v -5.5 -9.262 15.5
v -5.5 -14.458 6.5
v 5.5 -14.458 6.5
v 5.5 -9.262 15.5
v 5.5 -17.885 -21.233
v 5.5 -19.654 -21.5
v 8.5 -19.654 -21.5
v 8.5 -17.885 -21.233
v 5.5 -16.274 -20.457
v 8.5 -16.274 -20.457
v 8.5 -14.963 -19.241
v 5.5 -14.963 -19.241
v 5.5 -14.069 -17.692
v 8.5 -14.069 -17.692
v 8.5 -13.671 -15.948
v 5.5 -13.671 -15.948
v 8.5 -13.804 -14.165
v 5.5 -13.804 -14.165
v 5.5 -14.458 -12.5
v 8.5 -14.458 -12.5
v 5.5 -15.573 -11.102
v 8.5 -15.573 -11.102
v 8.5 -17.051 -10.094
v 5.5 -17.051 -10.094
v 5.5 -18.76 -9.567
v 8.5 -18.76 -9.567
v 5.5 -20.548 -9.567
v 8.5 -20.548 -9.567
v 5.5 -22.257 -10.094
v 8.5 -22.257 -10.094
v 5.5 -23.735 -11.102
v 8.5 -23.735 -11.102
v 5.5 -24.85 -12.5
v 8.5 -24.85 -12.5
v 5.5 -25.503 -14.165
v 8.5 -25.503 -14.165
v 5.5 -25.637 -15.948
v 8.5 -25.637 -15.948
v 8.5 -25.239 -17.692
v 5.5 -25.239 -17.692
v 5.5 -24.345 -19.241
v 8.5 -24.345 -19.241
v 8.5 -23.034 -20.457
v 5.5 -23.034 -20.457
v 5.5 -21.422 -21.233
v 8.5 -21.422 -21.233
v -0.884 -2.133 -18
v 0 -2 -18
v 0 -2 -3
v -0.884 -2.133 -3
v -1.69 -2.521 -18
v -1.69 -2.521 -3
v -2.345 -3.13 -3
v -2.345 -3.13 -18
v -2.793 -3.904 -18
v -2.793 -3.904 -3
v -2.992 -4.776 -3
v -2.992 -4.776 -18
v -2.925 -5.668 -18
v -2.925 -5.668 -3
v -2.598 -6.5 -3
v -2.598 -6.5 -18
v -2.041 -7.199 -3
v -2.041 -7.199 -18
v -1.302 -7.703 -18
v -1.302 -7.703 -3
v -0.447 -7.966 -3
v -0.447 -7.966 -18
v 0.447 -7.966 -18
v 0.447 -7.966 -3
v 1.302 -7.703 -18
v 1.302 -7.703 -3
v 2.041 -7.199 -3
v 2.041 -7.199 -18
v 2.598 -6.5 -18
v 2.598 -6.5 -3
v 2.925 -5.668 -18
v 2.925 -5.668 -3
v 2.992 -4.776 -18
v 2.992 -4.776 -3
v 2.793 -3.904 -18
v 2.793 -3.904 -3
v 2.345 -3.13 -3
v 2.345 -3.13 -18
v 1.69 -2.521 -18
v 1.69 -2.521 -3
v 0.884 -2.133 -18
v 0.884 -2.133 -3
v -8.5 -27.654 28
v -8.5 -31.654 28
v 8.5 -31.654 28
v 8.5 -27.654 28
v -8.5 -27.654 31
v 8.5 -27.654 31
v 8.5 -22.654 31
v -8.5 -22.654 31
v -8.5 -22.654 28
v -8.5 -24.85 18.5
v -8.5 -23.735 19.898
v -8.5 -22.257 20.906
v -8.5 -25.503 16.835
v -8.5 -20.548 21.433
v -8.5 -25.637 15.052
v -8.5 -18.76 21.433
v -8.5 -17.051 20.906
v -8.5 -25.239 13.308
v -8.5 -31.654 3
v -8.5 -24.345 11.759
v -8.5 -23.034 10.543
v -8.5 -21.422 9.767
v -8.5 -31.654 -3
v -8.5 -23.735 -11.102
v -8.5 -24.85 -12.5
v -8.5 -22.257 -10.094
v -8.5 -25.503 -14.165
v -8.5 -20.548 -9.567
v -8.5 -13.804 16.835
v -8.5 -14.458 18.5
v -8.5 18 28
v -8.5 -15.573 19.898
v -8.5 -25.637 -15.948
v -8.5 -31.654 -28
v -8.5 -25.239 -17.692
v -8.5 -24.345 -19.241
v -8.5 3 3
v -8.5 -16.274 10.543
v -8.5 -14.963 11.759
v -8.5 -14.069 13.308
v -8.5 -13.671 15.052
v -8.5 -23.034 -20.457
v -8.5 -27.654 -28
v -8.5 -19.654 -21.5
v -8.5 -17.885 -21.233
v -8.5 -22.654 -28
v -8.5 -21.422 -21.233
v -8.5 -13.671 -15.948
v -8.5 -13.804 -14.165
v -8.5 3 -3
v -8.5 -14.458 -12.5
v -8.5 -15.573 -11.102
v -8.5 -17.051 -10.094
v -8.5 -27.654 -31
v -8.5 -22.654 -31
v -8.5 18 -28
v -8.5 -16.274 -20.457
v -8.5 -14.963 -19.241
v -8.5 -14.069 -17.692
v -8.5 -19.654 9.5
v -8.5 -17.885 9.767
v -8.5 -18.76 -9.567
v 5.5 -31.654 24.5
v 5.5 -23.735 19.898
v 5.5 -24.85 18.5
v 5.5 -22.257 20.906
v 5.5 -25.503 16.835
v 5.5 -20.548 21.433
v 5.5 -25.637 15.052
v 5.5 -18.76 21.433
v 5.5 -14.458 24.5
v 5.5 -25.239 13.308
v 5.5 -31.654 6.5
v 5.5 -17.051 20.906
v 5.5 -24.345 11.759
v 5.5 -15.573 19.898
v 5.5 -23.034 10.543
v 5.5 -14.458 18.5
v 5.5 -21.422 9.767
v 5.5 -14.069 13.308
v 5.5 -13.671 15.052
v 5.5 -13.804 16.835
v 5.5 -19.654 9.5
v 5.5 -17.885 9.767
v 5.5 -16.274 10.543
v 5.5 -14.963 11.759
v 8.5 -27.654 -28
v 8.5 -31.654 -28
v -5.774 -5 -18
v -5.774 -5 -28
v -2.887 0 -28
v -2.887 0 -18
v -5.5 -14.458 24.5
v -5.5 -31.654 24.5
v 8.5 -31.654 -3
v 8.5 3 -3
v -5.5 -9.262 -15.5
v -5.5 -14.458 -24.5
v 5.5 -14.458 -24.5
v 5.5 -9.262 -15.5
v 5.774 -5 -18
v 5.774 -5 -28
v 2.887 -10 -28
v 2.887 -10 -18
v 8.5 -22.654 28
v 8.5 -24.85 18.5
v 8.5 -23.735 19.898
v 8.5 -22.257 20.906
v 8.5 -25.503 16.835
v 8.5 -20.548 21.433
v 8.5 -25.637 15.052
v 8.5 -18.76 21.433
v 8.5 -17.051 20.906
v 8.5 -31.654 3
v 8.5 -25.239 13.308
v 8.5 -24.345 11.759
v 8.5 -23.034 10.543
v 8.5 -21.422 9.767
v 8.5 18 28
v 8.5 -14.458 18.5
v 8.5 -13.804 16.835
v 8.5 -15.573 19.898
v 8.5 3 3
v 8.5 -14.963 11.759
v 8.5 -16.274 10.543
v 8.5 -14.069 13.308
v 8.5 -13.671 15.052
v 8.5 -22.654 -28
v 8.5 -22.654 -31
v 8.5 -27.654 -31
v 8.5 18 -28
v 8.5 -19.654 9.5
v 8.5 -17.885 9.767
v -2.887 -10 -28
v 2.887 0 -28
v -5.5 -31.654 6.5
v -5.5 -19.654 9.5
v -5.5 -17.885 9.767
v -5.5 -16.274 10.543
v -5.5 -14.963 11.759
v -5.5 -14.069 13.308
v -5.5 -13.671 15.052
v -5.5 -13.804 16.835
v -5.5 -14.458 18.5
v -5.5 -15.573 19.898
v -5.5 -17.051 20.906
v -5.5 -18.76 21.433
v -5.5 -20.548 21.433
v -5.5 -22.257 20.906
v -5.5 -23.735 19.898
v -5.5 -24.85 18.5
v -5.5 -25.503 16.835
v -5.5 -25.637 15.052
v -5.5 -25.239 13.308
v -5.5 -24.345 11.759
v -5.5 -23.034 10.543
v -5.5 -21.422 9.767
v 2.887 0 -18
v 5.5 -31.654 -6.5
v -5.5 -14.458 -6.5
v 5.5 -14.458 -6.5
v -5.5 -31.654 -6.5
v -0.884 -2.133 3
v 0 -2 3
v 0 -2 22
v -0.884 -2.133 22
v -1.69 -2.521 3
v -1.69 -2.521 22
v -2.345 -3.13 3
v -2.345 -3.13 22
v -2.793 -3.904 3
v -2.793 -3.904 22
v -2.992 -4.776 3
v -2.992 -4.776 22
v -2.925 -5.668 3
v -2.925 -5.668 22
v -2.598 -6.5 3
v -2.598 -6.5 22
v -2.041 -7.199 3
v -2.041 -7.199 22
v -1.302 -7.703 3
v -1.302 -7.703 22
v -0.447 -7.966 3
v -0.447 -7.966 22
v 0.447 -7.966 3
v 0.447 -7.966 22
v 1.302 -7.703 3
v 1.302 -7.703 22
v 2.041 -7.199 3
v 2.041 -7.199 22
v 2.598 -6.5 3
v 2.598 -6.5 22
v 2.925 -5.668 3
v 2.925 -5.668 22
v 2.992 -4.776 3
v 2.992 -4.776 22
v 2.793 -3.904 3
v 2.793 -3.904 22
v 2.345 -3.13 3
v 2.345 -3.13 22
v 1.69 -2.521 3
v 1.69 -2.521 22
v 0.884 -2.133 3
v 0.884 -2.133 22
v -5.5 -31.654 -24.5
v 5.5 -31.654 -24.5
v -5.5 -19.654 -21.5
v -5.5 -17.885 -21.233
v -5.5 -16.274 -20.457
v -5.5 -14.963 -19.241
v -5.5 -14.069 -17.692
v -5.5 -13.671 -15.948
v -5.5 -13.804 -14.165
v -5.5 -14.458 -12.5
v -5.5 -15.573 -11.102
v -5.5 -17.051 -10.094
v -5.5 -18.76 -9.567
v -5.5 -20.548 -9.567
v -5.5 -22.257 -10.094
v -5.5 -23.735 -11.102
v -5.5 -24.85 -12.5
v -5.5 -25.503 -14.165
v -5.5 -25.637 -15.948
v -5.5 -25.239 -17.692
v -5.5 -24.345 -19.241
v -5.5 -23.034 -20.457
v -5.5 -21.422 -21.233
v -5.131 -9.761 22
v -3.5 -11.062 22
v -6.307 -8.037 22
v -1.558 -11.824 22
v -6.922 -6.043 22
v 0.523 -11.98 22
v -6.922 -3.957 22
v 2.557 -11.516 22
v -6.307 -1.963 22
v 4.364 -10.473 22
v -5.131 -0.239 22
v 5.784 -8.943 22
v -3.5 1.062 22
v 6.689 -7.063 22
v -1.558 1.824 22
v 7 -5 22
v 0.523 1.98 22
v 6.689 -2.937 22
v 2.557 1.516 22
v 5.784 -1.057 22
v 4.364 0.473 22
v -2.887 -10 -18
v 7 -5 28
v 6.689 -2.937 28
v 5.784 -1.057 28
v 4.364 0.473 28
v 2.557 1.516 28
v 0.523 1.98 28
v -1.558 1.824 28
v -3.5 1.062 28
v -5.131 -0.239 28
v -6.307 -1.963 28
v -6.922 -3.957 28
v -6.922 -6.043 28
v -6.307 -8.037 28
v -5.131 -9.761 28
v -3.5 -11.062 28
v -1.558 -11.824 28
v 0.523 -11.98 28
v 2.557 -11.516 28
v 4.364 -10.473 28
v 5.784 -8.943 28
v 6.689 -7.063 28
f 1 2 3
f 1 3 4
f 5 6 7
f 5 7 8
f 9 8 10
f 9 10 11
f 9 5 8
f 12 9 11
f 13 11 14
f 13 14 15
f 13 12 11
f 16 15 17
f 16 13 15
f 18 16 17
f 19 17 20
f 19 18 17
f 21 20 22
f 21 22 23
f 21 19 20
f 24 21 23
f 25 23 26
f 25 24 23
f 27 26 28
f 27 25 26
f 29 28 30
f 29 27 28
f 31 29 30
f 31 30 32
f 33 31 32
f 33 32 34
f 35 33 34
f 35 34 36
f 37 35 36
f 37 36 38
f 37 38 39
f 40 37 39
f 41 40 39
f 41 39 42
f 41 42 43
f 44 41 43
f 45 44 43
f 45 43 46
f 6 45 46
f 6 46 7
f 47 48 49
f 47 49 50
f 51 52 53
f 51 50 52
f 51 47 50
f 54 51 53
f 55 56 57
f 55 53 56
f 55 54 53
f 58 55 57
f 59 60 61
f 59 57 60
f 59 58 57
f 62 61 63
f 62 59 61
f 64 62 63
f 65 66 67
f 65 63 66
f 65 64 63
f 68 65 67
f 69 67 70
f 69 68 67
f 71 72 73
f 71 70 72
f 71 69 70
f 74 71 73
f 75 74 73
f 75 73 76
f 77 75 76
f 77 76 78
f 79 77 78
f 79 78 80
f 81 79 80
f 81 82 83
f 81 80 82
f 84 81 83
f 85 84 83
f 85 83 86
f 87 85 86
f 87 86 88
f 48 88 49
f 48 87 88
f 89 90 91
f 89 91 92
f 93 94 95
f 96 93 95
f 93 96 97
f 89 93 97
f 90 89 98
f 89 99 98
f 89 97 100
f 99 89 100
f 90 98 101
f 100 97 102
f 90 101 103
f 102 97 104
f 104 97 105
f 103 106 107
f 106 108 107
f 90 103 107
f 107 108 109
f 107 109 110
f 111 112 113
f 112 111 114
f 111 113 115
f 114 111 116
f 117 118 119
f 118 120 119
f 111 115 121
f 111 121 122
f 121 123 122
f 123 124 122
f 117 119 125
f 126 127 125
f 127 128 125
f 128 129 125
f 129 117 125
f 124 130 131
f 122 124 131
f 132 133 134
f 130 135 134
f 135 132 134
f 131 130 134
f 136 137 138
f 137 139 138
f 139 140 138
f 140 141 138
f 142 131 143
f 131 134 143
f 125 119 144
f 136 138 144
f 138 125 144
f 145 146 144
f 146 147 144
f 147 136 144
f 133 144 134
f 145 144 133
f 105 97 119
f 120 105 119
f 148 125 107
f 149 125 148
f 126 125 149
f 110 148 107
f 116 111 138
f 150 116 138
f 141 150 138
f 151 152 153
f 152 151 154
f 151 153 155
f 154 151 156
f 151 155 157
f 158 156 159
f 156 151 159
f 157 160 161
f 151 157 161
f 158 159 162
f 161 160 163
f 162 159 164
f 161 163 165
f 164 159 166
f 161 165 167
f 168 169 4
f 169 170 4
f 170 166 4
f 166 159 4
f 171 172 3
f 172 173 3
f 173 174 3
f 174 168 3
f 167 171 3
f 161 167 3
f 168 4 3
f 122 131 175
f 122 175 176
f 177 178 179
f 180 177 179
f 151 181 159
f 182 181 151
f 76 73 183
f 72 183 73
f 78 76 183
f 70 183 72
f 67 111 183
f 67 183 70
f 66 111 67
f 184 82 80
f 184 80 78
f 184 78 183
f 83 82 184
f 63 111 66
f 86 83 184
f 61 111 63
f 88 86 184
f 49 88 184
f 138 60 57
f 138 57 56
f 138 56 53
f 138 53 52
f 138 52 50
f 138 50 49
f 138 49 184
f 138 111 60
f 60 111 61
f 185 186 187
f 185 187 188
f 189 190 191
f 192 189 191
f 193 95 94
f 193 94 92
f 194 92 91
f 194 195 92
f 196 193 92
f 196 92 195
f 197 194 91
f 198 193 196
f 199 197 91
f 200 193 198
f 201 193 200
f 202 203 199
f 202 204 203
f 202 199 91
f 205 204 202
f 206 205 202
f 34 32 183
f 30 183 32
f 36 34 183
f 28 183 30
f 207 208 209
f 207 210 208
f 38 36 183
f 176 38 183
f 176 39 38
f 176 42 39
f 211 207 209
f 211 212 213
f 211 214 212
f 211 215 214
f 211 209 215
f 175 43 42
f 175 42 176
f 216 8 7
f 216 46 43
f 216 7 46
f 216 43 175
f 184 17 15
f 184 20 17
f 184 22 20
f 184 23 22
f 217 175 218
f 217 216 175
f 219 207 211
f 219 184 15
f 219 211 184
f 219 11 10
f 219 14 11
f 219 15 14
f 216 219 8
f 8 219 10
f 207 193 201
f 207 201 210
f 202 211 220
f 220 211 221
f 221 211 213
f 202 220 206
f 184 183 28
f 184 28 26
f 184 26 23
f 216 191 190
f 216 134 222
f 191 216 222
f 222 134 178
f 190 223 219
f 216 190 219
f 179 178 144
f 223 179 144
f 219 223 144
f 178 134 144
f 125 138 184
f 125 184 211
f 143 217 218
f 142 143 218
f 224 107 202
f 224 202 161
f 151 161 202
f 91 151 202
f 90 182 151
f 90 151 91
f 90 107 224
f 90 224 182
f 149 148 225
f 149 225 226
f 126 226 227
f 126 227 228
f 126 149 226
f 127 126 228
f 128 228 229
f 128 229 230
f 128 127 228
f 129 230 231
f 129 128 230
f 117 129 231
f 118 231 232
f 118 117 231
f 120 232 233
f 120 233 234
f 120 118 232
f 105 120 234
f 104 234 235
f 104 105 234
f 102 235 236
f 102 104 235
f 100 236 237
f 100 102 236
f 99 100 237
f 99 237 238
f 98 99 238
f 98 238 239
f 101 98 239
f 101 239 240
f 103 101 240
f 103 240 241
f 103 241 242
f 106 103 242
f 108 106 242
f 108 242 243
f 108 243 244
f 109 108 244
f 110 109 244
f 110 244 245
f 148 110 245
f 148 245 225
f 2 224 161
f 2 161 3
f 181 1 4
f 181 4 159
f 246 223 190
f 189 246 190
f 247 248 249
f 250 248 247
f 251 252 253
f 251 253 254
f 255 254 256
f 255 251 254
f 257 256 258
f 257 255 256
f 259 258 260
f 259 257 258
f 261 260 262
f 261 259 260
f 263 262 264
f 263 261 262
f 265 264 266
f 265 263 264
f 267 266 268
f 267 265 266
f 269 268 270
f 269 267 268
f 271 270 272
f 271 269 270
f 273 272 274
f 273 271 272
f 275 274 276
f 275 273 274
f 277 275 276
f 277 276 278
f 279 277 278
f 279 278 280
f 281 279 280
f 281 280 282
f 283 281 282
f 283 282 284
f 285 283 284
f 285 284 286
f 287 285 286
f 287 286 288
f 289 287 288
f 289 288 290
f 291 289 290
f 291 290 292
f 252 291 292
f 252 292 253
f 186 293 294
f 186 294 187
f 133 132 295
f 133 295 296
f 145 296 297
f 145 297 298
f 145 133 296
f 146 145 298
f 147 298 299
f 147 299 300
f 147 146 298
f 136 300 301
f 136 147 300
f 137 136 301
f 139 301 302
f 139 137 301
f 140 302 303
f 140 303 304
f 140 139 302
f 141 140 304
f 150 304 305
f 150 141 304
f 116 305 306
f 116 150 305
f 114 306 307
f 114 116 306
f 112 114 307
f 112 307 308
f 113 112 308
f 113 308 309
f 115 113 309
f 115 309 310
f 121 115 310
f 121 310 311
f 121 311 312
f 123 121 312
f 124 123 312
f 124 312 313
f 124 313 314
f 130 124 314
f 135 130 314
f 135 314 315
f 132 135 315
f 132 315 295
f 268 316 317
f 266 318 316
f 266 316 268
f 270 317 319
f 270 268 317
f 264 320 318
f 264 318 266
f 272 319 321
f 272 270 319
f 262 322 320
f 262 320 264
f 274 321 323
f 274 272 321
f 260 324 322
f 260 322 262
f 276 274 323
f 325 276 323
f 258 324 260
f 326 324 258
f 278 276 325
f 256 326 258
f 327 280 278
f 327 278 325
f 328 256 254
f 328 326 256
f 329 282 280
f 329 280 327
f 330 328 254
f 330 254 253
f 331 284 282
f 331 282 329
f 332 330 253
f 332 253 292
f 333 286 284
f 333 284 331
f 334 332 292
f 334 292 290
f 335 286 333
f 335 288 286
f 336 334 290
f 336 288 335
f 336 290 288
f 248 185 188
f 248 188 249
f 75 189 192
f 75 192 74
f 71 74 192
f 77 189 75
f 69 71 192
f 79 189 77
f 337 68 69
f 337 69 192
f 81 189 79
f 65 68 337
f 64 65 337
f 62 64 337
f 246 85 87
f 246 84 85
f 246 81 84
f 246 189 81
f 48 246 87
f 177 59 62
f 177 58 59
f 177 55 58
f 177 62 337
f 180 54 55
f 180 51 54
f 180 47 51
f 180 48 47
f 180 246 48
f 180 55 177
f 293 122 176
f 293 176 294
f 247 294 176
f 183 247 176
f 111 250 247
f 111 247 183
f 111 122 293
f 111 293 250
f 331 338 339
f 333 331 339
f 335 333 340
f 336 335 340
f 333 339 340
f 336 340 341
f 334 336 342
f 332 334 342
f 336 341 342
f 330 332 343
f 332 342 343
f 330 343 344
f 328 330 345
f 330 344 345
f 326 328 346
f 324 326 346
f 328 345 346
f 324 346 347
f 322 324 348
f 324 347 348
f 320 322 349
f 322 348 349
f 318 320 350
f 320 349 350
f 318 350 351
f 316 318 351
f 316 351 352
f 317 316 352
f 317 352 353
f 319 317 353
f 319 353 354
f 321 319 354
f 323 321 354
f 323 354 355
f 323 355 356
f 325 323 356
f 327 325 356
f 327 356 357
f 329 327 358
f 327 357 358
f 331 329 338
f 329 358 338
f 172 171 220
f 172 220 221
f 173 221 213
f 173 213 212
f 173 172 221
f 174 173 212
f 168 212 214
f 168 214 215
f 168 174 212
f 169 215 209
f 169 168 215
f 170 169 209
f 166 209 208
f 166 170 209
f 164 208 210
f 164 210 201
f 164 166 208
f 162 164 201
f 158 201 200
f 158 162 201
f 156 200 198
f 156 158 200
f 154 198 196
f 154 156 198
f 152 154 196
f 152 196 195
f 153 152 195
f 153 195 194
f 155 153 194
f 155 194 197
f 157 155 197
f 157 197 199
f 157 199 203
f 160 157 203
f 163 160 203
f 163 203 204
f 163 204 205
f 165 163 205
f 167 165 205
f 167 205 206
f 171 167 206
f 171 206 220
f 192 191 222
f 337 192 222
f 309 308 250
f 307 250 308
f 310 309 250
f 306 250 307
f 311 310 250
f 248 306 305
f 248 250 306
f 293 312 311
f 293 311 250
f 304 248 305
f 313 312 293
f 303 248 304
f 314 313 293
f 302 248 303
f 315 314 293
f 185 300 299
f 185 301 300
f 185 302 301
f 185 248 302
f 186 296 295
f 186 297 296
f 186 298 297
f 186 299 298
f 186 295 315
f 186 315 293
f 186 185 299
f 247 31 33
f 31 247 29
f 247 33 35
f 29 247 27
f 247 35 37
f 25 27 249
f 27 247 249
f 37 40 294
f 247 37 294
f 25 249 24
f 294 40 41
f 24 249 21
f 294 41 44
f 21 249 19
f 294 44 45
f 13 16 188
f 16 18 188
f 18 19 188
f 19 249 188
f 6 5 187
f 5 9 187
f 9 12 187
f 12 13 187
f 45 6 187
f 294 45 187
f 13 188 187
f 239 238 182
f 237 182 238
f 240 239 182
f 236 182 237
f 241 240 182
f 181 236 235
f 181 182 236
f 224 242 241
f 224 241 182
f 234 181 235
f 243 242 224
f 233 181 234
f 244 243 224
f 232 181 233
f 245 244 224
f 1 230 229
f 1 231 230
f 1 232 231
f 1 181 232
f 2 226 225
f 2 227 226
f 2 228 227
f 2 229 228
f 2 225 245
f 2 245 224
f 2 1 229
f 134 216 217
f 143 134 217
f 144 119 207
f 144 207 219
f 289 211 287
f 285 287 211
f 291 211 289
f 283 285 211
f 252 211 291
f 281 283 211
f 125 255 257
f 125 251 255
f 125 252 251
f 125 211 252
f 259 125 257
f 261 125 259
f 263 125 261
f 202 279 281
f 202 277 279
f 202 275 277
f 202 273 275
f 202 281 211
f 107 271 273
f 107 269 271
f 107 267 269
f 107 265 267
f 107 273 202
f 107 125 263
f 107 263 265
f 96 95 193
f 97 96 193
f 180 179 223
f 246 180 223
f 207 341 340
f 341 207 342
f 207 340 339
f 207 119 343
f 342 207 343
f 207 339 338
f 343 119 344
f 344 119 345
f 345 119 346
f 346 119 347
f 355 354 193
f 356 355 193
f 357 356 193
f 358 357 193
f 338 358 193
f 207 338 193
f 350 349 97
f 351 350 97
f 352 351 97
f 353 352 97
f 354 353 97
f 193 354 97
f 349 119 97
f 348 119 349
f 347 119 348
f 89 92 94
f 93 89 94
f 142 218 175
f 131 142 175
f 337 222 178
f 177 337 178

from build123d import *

# Parameters (mm, degrees)
BOSS_EXTRUDE2_DEPTH      = 8.5
BOSS_EXTRUDE2_DEPTH_BACK = 8.5
SKETCH1_R                = 6
CUT_EXTRUDE1_DEPTH       = 5.5
CUT_EXTRUDE1_DEPTH_BACK  = 5.5
SKETCH1_4_R              = 6
CUT_EXTRUDE2_DEPTH       = 68.492341935
CUT_EXTRUDE2_DEPTH_BACK  = 68.492341935
SKETCH3_R                = 3
SKETCH3_3_R              = 7
SKETCH3_3_R_2            = 3
CUT_EXTRUDE3_DEPTH       = 6
CUT_EXTRUDE4_DEPTH       = 10


with BuildPart() as part:
    # Sketch1 → Boss-Extrude2 (new, two sides: drawn at the far end of the back side and taken through both)
    with BuildSketch(Plane(origin=(0, 0, 0), x_dir=(0, 0, -1), z_dir=(1, 0, 0)).offset(-BOSS_EXTRUDE2_DEPTH_BACK)):
        Polygon((-28, -22.65385), (-31, -22.65385), (-31, -27.65385), (-28, -27.65385), (-28, -31.65385), (-3, -31.65385), (-3, 3), (3, 3), (3, -31.65385), (28, -31.65385), (28, -27.65385), (31, -27.65385), (31, -22.65385), (28, -22.65385), (28, 18), (-28, 18), align=None)
        with Locations((15.5, -19.65385)):
            Circle(SKETCH1_R, mode=Mode.SUBTRACT)
        with Locations((-15.5, -19.65385)):
            Circle(SKETCH1_R, mode=Mode.SUBTRACT)
    extrude(amount=BOSS_EXTRUDE2_DEPTH + BOSS_EXTRUDE2_DEPTH_BACK)

    # Sketch1<4> → Cut-Extrude1 (cut, two sides: drawn at the far end of the back side and taken through both)
    # profile 1 of 2: a face of its own
    with BuildSketch(Plane(origin=(0, 0, 0), x_dir=(0, 0, -1), z_dir=(1, 0, 0)).offset(-CUT_EXTRUDE1_DEPTH_BACK)):
        Polygon((-24.5, -14.457697577), (-24.5, -31.65385), (-6.5, -31.65385), (-6.5, -14.457697577), (-15.5, -9.261545155), align=None)
        with Locations((-15.5, -19.65385)):
            Circle(SKETCH1_4_R, mode=Mode.SUBTRACT)
    # profile 2 of 2: a face of its own
    with BuildSketch(Plane(origin=(0, 0, 0), x_dir=(0, 0, -1), z_dir=(1, 0, 0)).offset(-CUT_EXTRUDE1_DEPTH_BACK)):
        Polygon((6.5, -31.65385), (24.5, -31.65385), (24.5, -14.457697577), (15.5, -9.261545155), (6.5, -14.457697577), align=None)
        with Locations((15.5, -19.65385)):
            Circle(SKETCH1_4_R, mode=Mode.SUBTRACT)
    extrude(amount=CUT_EXTRUDE1_DEPTH + CUT_EXTRUDE1_DEPTH_BACK, mode=Mode.SUBTRACT)

    # Sketch3 → Cut-Extrude2 (cut, two sides: drawn at the far end of the back side and taken through both)
    with BuildSketch(Plane.XY.offset(28).offset(-CUT_EXTRUDE2_DEPTH_BACK)):
        with Locations((0, -5)):
            Circle(SKETCH3_R)
    extrude(amount=CUT_EXTRUDE2_DEPTH + CUT_EXTRUDE2_DEPTH_BACK, mode=Mode.SUBTRACT)

    # Sketch3<3> → Cut-Extrude3 (cut)
    with BuildSketch(Plane.XY.offset(28)):
        with Locations((0, -5)):
            Circle(SKETCH3_3_R)
        with Locations((0, -5)):
            Circle(SKETCH3_3_R_2, mode=Mode.SUBTRACT)
    extrude(amount=-CUT_EXTRUDE3_DEPTH, mode=Mode.SUBTRACT)

    # Sketch4 → Cut-Extrude4 (cut)
    with BuildSketch(Plane(origin=(0, 0, -28), x_dir=(-1, 0, 0), z_dir=(0, 0, -1))):
        Polygon((5.773502692, -5), (2.886751346, 0), (-2.886751346, 0), (-5.773502692, -5), (-2.886751346, -10), (2.886751346, -10), align=None)
    extrude(amount=-CUT_EXTRUDE4_DEPTH, mode=Mode.SUBTRACT)


solid = part.part
